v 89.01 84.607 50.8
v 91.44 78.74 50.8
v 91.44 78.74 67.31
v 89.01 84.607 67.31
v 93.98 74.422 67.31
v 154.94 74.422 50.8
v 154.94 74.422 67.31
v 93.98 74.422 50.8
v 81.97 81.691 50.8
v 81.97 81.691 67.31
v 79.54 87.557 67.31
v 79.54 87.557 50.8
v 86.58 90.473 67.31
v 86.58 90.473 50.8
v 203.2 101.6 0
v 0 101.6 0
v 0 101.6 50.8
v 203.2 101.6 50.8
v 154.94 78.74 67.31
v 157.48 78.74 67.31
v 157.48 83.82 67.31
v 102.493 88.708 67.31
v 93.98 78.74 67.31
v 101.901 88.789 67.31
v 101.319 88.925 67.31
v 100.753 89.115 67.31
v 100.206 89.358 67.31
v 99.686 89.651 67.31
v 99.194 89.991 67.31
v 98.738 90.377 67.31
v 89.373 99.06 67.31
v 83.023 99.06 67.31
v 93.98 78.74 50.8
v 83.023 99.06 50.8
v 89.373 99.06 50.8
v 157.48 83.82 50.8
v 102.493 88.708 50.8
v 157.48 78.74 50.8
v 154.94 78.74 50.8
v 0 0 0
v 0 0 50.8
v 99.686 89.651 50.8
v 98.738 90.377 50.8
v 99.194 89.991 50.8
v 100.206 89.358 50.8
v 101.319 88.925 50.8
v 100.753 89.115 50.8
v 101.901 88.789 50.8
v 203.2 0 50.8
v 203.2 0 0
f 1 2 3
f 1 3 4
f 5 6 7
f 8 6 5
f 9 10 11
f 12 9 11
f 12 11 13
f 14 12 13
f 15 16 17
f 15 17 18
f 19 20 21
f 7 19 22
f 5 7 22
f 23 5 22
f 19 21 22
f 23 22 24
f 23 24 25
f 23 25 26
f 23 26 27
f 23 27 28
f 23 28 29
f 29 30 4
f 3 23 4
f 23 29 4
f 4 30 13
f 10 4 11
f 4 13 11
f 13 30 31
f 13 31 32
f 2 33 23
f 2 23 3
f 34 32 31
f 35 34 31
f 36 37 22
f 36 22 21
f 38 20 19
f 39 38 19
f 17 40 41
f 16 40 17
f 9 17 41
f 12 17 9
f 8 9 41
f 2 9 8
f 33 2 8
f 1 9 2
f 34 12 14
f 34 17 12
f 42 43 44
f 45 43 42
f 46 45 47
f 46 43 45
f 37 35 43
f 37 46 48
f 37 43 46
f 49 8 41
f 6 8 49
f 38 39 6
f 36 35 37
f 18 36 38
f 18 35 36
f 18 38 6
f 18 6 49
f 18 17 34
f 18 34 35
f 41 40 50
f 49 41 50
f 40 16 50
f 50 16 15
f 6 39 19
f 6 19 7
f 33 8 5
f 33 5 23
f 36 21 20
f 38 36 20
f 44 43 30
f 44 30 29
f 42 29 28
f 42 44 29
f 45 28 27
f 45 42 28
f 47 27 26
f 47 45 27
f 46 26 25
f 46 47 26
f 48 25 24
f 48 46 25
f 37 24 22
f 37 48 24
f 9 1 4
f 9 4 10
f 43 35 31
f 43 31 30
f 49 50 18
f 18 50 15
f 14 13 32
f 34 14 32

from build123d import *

# Parameters (mm, degrees)
SKETCH1_W      = 203.2
SKETCH1_H      = 101.6
EXTRUDE1_DEPTH = 50.8
EXTRUDE2_DEPTH = 16.51


with BuildPart() as part:
    # Sketch1 → Extrude1 (new body)
    with BuildSketch(Plane.XY):
        with Locations((101.6, 50.8)):
            Rectangle(SKETCH1_W, SKETCH1_H)
    extrude(amount=EXTRUDE1_DEPTH)

    # Sketch20 → Extrude2 (add)
    with BuildSketch(Plane.XY.offset(50.8)):
        with BuildLine():
            ThreePointArc((98.73765298, 90.37654578), (100.476619995, 89.229944151), (102.493050685, 88.707728828))
            Line((102.493050685, 88.707728828), (157.48, 83.82))
            Line((157.48, 83.82), (157.48, 78.74))
            Line((157.48, 78.74), (154.94, 78.74))
            Line((154.94, 78.74), (154.94, 74.422))
            Line((154.94, 74.422), (93.98, 74.422))
            Line((93.98, 74.422), (93.98, 78.74))
            Line((93.98, 78.74), (91.44, 78.74))
            Line((91.44, 78.74), (89.009960204, 84.606635031))
            Line((89.009960204, 84.606635031), (81.969998167, 81.690587277))
            Line((81.969998167, 81.690587277), (79.539958371, 87.557222308))
            Line((79.539958371, 87.557222308), (86.579920409, 90.473270063))
            Line((86.579920409, 90.473270063), (83.023180413, 99.06))
            Line((83.023180413, 99.06), (89.373180413, 99.06))
            Line((89.373180413, 99.06), (98.73765298, 90.37654578))
        make_face()
    extrude(amount=EXTRUDE2_DEPTH)


solid = part.part
